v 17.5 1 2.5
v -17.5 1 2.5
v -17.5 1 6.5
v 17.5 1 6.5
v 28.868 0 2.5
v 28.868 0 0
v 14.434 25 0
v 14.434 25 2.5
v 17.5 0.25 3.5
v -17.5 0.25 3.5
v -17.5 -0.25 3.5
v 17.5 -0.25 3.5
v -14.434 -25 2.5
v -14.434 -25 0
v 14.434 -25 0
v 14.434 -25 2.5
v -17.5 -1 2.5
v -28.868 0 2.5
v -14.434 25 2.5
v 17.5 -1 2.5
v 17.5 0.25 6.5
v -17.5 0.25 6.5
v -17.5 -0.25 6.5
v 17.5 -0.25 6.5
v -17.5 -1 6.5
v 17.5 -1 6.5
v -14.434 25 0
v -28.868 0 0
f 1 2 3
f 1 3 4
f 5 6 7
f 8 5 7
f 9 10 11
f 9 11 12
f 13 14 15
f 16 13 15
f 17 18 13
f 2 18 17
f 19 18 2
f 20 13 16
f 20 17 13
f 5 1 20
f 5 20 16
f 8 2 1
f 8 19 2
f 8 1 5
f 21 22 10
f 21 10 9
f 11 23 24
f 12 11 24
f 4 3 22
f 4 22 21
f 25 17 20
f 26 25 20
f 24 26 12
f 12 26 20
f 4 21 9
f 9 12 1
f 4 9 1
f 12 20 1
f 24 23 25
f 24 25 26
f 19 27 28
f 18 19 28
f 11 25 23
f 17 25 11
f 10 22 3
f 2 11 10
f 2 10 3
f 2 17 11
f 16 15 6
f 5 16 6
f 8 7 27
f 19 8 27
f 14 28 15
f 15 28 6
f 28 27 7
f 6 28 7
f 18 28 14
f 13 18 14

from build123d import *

# Parameters (mm, degrees)
F1_DEPTH = 2.5
F2_W     = 35
F2_H     = 2
F3_DEPTH = 4
F4_W     = 50
F4_H     = 0.5
F5_DEPTH = 3


with BuildPart() as f1:
    # F0 (on Top) → F1 (new body)
    with BuildSketch(Plane.XY):
        Polygon((-14.433757, -25), (14.433757, -25), (28.867513, 0), (14.433757, 25), (-14.433757, 25), (-28.867513, 0), align=None)
    extrude(amount=F1_DEPTH)

    # F2 (on face) → F3 (join)
    with BuildSketch(Plane.XY.offset(2.5)):
        Rectangle(F2_W, F2_H)
    extrude(amount=F3_DEPTH)

    # F4 (on face) → F5 (cut)
    with BuildSketch(Plane.XY.offset(6.5)):
        with Locations((0.279709, 0)):
            Rectangle(F4_W, F4_H)
    extrude(amount=-F5_DEPTH, mode=Mode.SUBTRACT)


solid = f1.part
